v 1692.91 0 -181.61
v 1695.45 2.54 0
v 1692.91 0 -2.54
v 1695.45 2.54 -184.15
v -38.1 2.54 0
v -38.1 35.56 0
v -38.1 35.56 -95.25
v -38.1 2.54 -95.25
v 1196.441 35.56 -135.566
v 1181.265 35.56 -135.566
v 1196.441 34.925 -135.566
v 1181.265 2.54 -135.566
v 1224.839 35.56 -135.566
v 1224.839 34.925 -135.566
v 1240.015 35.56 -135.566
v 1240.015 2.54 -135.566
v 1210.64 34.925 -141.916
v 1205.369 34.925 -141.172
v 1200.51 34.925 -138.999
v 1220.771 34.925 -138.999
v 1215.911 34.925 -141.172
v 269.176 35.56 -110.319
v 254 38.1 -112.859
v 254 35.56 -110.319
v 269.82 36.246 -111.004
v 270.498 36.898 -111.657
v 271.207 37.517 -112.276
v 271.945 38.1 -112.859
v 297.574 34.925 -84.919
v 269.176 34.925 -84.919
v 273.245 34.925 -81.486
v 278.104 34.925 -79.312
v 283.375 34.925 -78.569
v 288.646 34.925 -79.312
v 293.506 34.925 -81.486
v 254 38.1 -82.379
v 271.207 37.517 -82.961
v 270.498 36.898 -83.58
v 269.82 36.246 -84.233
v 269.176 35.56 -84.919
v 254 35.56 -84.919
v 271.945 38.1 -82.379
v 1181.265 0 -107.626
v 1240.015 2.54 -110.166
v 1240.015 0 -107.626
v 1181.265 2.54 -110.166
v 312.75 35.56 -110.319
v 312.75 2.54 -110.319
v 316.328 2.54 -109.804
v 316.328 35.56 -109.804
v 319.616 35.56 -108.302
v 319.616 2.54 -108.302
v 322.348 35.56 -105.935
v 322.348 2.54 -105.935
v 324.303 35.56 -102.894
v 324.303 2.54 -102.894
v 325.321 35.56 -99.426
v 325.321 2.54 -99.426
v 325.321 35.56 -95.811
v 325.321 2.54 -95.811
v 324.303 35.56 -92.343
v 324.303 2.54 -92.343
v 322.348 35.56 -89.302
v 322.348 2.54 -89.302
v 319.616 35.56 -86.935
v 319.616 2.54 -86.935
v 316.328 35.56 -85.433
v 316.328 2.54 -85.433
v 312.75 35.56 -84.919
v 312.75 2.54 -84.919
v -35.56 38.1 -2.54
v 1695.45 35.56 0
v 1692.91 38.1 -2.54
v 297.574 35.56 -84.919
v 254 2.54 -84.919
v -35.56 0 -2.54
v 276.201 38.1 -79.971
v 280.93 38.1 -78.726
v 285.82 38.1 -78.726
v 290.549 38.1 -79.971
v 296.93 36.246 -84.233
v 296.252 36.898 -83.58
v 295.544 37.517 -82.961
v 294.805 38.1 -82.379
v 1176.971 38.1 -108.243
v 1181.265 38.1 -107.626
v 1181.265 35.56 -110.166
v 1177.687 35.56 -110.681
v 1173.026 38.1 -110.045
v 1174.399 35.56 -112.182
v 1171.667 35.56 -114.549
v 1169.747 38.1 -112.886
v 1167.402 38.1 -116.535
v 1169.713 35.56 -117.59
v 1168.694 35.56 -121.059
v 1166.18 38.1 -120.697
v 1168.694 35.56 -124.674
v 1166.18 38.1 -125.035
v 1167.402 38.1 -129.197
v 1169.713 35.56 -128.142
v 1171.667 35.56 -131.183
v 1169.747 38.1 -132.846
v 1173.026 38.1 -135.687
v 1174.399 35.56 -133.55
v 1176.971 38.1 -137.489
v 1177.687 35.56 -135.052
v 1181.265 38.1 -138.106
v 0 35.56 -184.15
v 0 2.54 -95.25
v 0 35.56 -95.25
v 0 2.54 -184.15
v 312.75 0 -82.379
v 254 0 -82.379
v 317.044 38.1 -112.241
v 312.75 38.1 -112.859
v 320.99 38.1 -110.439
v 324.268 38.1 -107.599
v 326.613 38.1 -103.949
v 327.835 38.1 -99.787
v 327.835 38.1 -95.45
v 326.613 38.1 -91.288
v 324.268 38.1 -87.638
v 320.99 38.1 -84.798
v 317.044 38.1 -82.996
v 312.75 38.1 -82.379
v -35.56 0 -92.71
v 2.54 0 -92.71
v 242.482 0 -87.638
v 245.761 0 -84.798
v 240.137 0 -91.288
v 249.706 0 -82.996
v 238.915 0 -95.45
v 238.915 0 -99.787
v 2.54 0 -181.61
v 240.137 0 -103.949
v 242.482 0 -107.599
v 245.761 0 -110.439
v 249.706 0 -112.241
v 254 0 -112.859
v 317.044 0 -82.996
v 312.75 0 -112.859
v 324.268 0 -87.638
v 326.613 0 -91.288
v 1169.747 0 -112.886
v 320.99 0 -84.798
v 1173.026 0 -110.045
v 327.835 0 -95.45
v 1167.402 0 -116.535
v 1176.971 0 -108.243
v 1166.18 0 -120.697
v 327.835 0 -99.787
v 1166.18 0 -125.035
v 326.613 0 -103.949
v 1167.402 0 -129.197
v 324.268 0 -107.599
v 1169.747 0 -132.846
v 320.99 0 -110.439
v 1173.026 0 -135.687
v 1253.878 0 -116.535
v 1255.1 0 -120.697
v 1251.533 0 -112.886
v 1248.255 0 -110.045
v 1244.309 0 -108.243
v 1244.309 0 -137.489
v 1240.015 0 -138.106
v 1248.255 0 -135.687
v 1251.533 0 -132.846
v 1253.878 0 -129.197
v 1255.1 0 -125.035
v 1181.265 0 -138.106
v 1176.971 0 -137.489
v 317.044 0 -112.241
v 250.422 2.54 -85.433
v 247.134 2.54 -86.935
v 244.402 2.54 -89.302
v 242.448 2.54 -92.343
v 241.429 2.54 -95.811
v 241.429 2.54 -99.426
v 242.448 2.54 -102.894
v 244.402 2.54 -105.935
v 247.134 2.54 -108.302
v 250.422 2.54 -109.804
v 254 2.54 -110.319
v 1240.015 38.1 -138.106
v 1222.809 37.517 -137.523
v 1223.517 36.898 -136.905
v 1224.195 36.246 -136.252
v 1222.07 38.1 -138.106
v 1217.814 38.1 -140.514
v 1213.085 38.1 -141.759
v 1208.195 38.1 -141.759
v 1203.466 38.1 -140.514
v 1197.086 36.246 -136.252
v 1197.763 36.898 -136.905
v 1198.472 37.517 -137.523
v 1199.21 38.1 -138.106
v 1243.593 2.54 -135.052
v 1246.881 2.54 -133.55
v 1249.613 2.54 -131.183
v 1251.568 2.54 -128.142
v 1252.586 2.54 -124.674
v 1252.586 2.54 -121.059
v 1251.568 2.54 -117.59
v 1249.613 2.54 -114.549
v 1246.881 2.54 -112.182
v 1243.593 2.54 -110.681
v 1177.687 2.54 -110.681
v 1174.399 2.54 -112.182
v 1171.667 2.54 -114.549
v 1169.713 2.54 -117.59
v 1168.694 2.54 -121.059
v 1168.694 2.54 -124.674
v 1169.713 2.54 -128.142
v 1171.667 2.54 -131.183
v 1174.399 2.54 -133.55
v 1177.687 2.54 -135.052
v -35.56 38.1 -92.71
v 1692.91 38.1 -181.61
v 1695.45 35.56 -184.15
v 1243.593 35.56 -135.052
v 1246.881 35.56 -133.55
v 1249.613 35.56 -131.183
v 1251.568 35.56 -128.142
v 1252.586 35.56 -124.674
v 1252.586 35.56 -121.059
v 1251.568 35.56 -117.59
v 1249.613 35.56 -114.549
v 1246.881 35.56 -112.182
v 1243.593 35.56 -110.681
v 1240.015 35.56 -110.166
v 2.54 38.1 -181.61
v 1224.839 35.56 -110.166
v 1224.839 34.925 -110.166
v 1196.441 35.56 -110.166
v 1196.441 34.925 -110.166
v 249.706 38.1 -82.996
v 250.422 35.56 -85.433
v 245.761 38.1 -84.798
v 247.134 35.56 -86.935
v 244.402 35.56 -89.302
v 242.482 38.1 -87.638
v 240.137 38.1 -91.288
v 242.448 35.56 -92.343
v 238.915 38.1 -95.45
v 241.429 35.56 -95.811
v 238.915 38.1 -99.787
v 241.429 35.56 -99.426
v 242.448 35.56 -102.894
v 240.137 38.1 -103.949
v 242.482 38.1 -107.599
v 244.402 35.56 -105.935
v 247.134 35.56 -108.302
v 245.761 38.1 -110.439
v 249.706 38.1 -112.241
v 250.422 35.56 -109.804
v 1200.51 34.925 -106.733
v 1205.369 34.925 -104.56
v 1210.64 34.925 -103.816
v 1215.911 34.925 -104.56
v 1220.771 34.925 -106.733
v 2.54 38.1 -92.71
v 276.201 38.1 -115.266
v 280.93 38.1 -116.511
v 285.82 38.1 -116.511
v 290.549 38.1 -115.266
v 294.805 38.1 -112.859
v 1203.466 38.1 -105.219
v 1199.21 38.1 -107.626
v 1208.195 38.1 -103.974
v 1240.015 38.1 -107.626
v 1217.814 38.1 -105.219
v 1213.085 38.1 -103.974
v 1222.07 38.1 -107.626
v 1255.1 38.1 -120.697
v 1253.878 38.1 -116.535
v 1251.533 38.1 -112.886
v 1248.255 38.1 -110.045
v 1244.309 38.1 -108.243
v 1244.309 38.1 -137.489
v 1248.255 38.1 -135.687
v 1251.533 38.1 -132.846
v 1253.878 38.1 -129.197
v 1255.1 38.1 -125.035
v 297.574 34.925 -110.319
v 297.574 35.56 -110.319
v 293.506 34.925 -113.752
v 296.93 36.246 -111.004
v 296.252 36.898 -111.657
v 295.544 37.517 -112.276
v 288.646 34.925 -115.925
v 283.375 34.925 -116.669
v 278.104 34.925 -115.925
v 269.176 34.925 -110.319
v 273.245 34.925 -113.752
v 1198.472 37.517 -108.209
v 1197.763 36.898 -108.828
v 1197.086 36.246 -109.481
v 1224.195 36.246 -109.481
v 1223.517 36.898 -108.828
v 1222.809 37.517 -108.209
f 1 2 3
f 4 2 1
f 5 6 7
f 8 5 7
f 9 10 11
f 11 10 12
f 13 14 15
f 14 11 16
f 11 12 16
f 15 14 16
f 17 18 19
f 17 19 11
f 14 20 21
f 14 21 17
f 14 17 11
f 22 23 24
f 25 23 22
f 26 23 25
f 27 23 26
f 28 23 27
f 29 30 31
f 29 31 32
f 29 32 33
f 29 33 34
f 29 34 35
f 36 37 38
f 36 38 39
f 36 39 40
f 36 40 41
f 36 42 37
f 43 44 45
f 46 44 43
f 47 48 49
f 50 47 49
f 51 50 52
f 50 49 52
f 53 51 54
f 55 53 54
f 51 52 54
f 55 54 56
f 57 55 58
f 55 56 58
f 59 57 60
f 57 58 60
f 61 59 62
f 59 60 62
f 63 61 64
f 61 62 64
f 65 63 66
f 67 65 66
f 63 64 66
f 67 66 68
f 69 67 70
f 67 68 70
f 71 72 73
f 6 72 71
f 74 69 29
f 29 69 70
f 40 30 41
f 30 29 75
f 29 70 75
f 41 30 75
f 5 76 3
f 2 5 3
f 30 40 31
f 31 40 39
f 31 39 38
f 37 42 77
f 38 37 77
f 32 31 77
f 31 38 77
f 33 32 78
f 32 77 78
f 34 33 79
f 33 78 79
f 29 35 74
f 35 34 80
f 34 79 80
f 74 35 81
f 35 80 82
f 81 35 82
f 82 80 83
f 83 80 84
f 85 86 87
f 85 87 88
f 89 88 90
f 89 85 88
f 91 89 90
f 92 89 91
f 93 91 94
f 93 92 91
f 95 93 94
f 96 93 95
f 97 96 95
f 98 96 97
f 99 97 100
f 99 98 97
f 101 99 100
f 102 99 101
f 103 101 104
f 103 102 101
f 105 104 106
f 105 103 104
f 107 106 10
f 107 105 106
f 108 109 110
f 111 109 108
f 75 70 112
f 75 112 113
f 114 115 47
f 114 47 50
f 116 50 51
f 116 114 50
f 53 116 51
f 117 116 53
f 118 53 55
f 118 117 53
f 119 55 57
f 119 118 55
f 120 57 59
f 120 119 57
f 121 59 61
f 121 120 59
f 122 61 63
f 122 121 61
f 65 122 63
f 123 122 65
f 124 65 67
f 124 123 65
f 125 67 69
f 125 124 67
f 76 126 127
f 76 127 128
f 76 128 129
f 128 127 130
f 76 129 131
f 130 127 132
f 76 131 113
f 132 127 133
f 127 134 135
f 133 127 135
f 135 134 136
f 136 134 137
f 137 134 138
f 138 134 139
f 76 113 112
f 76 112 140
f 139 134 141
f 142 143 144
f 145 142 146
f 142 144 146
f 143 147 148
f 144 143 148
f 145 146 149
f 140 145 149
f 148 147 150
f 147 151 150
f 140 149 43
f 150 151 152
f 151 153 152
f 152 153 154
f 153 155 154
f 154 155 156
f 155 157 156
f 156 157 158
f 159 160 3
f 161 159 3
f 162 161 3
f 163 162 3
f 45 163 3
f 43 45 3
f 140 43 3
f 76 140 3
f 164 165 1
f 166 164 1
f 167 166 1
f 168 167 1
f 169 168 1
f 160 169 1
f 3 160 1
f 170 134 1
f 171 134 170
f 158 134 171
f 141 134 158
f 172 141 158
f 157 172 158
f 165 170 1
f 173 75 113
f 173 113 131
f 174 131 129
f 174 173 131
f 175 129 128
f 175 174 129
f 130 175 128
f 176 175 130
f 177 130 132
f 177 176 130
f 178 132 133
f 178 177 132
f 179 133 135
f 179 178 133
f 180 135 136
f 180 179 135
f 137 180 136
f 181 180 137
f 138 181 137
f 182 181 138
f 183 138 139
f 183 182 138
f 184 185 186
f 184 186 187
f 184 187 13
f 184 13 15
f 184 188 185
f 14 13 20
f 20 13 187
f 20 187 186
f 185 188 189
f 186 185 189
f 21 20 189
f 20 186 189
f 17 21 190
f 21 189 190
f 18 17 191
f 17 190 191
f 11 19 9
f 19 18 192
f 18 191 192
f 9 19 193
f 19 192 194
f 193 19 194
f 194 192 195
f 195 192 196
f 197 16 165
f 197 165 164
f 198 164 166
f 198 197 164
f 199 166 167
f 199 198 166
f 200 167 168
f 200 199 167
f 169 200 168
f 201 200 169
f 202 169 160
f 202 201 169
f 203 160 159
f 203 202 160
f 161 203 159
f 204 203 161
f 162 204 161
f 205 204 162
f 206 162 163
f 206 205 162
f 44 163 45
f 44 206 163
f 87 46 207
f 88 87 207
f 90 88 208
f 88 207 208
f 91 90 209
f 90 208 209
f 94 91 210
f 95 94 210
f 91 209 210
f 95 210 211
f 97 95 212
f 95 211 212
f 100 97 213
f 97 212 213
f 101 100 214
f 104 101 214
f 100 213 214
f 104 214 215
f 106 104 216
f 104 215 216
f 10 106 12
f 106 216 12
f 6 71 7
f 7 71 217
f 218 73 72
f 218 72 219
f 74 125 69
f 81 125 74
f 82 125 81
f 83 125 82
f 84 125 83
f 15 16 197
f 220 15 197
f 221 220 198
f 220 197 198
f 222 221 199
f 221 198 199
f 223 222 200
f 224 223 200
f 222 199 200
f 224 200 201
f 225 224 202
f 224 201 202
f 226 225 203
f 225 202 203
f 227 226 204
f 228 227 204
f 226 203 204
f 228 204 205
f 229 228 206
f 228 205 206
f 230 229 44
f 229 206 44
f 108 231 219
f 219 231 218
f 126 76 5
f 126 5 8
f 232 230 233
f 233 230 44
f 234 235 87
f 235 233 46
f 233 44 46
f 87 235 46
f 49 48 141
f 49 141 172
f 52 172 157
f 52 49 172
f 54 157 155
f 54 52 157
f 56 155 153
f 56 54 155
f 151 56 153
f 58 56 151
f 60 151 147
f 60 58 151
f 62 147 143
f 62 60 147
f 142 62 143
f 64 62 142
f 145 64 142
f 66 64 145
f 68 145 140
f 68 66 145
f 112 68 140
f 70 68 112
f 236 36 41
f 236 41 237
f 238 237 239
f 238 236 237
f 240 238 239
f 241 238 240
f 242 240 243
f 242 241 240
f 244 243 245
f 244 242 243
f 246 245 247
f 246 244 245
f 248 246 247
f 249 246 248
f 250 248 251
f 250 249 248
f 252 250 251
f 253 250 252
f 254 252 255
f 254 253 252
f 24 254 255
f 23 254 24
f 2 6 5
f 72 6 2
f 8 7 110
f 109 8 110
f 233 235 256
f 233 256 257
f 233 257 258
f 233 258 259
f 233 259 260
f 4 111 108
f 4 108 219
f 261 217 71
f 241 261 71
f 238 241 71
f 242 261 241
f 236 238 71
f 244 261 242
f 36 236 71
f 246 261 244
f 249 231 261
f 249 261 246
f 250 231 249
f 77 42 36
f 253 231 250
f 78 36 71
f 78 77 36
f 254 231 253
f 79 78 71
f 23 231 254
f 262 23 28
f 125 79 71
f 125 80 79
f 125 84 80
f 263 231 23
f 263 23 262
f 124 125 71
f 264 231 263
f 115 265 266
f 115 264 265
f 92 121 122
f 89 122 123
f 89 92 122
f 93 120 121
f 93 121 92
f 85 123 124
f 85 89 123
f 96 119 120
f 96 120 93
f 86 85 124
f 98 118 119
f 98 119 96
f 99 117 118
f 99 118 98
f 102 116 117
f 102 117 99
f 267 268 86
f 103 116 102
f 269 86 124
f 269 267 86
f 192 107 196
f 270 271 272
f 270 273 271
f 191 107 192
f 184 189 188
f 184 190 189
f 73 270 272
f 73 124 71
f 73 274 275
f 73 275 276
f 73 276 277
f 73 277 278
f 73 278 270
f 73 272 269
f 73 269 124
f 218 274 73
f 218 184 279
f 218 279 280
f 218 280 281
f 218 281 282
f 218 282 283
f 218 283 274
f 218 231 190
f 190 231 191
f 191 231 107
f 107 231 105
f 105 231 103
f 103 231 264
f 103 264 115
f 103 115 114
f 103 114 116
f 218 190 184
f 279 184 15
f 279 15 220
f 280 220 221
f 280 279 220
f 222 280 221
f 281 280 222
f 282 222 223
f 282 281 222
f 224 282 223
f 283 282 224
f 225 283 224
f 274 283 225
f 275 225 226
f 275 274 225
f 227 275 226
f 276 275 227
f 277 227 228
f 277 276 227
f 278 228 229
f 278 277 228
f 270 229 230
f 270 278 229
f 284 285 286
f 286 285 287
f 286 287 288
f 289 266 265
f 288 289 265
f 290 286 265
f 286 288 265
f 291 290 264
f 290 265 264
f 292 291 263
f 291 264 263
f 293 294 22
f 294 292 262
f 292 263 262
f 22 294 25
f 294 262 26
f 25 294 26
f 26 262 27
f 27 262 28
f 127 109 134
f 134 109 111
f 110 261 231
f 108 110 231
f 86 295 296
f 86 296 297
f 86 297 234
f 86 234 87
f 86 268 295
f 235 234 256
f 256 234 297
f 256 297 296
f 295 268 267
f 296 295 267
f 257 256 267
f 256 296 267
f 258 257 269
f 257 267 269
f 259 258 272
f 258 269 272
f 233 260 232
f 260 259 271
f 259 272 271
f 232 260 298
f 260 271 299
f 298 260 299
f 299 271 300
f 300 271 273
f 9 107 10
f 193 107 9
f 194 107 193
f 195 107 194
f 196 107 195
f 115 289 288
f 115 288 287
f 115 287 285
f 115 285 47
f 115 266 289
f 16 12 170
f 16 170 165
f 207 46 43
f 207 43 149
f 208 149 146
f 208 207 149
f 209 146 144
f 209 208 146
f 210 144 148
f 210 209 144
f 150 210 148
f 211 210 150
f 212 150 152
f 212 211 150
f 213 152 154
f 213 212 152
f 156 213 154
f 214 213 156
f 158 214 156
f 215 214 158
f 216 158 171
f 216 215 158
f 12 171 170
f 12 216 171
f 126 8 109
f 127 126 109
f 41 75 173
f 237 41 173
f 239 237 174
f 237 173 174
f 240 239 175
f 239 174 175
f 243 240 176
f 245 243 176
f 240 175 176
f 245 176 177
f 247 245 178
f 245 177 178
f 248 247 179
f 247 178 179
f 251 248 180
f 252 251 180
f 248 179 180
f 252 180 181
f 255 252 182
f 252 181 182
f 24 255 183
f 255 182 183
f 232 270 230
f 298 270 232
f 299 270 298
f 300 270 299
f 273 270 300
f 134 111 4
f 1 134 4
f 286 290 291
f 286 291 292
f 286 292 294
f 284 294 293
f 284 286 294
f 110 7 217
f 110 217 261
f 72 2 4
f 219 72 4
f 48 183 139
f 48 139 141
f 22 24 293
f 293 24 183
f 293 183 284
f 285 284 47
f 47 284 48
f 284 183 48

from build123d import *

# Parameters (mm, degrees)
SKETCH1_W           = 1695.45
SKETCH1_H           = 184.15
BOSS_EXTRUDE1_DEPTH = 38.1
SKETCH2_W           = 38.1
SKETCH2_H           = 95.25
BOSS_EXTRUDE3_DEPTH = 38.1
CHAMFER1_SIZE       = 2.54
CHAMFER2_SIZE       = 2.54
SKETCH3_R           = 19.05
CUT_EXTRUDE1_DEPTH  = 3.175


with BuildPart() as part:
    # Sketch1 → Boss-Extrude1 (new body)
    with BuildSketch(Plane(origin=(0, 0, 0), x_dir=(1, 0, 0), z_dir=(0, 1, 0))):
        with Locations((847.725, 92.075)):
            Rectangle(SKETCH1_W, SKETCH1_H)
        with BuildLine():
            Line((1181.2651, 135.56615), (1240.0153, 135.56615))
            ThreePointArc((1240.0153, 135.56615), (1252.7153, 122.86615), (1240.0153, 110.16615))
            Line((1240.0153, 110.16615), (1181.2651, 110.16615))
            ThreePointArc((1181.2651, 110.16615), (1168.5651, 122.86615), (1181.2651, 135.56615))
        make_face(mode=Mode.SUBTRACT)
        with BuildLine():
            Line((254, 110.31855), (312.7502, 110.31855))
            ThreePointArc((312.7502, 110.31855), (325.4502, 97.61855), (312.7502, 84.91855))
            Line((312.7502, 84.91855), (254, 84.91855))
            ThreePointArc((254, 84.91855), (241.3, 97.61855), (254, 110.31855))
        make_face(mode=Mode.SUBTRACT)
    extrude(amount=BOSS_EXTRUDE1_DEPTH)

    # Sketch2 → Boss-Extrude3 (add, through all)
    with BuildSketch(Plane(origin=(0, 38.1, 0), x_dir=(1, 0, 0), z_dir=(0, 1, 0))):
        with Locations((-19.05, 47.625)):
            Rectangle(SKETCH2_W, SKETCH2_H)
    extrude(amount=-BOSS_EXTRUDE3_DEPTH)

    # Chamfer1
    chamfer1_edges = [part.edges().sort_by_distance(p)[0] for p in [
        (1695.45, 38.1, -92.075),
        (1252.7153, 38.1, -122.86615),
        (847.725, 38.1, -184.15),
        (1210.6402, 38.1, -135.56615),
        (1168.5651, 38.1, -122.86615),
        (1210.6402, 38.1, -110.16615),
        (325.4502, 38.1, -97.61855),
        (283.3751, 38.1, -110.31855),
        (241.3, 38.1, -97.61855),
        (283.3751, 38.1, -84.91855),
        (-19.05, 38.1, -95.25),
        (-38.1, 38.1, -47.625),
        (0, 38.1, -139.7),
        (828.675, 38.1, 0),
    ]]
    chamfer(chamfer1_edges, length=CHAMFER1_SIZE)

    # Chamfer2
    chamfer2_edges = [part.edges().sort_by_distance(p)[0] for p in [
        (1252.7153, 0, -122.86615),
        (1210.6402, 0, -135.56615),
        (1168.5651, 0, -122.86615),
        (1210.6402, 0, -110.16615),
        (325.4502, 0, -97.61855),
        (283.3751, 0, -110.31855),
        (241.3, 0, -97.61855),
        (283.3751, 0, -84.91855),
        (-38.1, 0, -47.625),
        (-19.05, 0, -95.25),
        (847.725, 0, -184.15),
        (1695.45, 0, -92.075),
        (828.675, 0, 0),
        (0, 0, -139.7),
    ]]
    chamfer(chamfer2_edges, length=CHAMFER2_SIZE)

    # Sketch3 → Cut-Extrude1 (cut)
    with BuildSketch(Plane(origin=(0, 38.1, 0), x_dir=(1, 0, 0), z_dir=(0, 1, 0))):
        with Locations((1210.6402, 122.86615)):
            Circle(SKETCH3_R)
        with Locations((283.3751, 97.61855)):
            Circle(SKETCH3_R)
    extrude(amount=-CUT_EXTRUDE1_DEPTH, mode=Mode.SUBTRACT)


solid = part.part
